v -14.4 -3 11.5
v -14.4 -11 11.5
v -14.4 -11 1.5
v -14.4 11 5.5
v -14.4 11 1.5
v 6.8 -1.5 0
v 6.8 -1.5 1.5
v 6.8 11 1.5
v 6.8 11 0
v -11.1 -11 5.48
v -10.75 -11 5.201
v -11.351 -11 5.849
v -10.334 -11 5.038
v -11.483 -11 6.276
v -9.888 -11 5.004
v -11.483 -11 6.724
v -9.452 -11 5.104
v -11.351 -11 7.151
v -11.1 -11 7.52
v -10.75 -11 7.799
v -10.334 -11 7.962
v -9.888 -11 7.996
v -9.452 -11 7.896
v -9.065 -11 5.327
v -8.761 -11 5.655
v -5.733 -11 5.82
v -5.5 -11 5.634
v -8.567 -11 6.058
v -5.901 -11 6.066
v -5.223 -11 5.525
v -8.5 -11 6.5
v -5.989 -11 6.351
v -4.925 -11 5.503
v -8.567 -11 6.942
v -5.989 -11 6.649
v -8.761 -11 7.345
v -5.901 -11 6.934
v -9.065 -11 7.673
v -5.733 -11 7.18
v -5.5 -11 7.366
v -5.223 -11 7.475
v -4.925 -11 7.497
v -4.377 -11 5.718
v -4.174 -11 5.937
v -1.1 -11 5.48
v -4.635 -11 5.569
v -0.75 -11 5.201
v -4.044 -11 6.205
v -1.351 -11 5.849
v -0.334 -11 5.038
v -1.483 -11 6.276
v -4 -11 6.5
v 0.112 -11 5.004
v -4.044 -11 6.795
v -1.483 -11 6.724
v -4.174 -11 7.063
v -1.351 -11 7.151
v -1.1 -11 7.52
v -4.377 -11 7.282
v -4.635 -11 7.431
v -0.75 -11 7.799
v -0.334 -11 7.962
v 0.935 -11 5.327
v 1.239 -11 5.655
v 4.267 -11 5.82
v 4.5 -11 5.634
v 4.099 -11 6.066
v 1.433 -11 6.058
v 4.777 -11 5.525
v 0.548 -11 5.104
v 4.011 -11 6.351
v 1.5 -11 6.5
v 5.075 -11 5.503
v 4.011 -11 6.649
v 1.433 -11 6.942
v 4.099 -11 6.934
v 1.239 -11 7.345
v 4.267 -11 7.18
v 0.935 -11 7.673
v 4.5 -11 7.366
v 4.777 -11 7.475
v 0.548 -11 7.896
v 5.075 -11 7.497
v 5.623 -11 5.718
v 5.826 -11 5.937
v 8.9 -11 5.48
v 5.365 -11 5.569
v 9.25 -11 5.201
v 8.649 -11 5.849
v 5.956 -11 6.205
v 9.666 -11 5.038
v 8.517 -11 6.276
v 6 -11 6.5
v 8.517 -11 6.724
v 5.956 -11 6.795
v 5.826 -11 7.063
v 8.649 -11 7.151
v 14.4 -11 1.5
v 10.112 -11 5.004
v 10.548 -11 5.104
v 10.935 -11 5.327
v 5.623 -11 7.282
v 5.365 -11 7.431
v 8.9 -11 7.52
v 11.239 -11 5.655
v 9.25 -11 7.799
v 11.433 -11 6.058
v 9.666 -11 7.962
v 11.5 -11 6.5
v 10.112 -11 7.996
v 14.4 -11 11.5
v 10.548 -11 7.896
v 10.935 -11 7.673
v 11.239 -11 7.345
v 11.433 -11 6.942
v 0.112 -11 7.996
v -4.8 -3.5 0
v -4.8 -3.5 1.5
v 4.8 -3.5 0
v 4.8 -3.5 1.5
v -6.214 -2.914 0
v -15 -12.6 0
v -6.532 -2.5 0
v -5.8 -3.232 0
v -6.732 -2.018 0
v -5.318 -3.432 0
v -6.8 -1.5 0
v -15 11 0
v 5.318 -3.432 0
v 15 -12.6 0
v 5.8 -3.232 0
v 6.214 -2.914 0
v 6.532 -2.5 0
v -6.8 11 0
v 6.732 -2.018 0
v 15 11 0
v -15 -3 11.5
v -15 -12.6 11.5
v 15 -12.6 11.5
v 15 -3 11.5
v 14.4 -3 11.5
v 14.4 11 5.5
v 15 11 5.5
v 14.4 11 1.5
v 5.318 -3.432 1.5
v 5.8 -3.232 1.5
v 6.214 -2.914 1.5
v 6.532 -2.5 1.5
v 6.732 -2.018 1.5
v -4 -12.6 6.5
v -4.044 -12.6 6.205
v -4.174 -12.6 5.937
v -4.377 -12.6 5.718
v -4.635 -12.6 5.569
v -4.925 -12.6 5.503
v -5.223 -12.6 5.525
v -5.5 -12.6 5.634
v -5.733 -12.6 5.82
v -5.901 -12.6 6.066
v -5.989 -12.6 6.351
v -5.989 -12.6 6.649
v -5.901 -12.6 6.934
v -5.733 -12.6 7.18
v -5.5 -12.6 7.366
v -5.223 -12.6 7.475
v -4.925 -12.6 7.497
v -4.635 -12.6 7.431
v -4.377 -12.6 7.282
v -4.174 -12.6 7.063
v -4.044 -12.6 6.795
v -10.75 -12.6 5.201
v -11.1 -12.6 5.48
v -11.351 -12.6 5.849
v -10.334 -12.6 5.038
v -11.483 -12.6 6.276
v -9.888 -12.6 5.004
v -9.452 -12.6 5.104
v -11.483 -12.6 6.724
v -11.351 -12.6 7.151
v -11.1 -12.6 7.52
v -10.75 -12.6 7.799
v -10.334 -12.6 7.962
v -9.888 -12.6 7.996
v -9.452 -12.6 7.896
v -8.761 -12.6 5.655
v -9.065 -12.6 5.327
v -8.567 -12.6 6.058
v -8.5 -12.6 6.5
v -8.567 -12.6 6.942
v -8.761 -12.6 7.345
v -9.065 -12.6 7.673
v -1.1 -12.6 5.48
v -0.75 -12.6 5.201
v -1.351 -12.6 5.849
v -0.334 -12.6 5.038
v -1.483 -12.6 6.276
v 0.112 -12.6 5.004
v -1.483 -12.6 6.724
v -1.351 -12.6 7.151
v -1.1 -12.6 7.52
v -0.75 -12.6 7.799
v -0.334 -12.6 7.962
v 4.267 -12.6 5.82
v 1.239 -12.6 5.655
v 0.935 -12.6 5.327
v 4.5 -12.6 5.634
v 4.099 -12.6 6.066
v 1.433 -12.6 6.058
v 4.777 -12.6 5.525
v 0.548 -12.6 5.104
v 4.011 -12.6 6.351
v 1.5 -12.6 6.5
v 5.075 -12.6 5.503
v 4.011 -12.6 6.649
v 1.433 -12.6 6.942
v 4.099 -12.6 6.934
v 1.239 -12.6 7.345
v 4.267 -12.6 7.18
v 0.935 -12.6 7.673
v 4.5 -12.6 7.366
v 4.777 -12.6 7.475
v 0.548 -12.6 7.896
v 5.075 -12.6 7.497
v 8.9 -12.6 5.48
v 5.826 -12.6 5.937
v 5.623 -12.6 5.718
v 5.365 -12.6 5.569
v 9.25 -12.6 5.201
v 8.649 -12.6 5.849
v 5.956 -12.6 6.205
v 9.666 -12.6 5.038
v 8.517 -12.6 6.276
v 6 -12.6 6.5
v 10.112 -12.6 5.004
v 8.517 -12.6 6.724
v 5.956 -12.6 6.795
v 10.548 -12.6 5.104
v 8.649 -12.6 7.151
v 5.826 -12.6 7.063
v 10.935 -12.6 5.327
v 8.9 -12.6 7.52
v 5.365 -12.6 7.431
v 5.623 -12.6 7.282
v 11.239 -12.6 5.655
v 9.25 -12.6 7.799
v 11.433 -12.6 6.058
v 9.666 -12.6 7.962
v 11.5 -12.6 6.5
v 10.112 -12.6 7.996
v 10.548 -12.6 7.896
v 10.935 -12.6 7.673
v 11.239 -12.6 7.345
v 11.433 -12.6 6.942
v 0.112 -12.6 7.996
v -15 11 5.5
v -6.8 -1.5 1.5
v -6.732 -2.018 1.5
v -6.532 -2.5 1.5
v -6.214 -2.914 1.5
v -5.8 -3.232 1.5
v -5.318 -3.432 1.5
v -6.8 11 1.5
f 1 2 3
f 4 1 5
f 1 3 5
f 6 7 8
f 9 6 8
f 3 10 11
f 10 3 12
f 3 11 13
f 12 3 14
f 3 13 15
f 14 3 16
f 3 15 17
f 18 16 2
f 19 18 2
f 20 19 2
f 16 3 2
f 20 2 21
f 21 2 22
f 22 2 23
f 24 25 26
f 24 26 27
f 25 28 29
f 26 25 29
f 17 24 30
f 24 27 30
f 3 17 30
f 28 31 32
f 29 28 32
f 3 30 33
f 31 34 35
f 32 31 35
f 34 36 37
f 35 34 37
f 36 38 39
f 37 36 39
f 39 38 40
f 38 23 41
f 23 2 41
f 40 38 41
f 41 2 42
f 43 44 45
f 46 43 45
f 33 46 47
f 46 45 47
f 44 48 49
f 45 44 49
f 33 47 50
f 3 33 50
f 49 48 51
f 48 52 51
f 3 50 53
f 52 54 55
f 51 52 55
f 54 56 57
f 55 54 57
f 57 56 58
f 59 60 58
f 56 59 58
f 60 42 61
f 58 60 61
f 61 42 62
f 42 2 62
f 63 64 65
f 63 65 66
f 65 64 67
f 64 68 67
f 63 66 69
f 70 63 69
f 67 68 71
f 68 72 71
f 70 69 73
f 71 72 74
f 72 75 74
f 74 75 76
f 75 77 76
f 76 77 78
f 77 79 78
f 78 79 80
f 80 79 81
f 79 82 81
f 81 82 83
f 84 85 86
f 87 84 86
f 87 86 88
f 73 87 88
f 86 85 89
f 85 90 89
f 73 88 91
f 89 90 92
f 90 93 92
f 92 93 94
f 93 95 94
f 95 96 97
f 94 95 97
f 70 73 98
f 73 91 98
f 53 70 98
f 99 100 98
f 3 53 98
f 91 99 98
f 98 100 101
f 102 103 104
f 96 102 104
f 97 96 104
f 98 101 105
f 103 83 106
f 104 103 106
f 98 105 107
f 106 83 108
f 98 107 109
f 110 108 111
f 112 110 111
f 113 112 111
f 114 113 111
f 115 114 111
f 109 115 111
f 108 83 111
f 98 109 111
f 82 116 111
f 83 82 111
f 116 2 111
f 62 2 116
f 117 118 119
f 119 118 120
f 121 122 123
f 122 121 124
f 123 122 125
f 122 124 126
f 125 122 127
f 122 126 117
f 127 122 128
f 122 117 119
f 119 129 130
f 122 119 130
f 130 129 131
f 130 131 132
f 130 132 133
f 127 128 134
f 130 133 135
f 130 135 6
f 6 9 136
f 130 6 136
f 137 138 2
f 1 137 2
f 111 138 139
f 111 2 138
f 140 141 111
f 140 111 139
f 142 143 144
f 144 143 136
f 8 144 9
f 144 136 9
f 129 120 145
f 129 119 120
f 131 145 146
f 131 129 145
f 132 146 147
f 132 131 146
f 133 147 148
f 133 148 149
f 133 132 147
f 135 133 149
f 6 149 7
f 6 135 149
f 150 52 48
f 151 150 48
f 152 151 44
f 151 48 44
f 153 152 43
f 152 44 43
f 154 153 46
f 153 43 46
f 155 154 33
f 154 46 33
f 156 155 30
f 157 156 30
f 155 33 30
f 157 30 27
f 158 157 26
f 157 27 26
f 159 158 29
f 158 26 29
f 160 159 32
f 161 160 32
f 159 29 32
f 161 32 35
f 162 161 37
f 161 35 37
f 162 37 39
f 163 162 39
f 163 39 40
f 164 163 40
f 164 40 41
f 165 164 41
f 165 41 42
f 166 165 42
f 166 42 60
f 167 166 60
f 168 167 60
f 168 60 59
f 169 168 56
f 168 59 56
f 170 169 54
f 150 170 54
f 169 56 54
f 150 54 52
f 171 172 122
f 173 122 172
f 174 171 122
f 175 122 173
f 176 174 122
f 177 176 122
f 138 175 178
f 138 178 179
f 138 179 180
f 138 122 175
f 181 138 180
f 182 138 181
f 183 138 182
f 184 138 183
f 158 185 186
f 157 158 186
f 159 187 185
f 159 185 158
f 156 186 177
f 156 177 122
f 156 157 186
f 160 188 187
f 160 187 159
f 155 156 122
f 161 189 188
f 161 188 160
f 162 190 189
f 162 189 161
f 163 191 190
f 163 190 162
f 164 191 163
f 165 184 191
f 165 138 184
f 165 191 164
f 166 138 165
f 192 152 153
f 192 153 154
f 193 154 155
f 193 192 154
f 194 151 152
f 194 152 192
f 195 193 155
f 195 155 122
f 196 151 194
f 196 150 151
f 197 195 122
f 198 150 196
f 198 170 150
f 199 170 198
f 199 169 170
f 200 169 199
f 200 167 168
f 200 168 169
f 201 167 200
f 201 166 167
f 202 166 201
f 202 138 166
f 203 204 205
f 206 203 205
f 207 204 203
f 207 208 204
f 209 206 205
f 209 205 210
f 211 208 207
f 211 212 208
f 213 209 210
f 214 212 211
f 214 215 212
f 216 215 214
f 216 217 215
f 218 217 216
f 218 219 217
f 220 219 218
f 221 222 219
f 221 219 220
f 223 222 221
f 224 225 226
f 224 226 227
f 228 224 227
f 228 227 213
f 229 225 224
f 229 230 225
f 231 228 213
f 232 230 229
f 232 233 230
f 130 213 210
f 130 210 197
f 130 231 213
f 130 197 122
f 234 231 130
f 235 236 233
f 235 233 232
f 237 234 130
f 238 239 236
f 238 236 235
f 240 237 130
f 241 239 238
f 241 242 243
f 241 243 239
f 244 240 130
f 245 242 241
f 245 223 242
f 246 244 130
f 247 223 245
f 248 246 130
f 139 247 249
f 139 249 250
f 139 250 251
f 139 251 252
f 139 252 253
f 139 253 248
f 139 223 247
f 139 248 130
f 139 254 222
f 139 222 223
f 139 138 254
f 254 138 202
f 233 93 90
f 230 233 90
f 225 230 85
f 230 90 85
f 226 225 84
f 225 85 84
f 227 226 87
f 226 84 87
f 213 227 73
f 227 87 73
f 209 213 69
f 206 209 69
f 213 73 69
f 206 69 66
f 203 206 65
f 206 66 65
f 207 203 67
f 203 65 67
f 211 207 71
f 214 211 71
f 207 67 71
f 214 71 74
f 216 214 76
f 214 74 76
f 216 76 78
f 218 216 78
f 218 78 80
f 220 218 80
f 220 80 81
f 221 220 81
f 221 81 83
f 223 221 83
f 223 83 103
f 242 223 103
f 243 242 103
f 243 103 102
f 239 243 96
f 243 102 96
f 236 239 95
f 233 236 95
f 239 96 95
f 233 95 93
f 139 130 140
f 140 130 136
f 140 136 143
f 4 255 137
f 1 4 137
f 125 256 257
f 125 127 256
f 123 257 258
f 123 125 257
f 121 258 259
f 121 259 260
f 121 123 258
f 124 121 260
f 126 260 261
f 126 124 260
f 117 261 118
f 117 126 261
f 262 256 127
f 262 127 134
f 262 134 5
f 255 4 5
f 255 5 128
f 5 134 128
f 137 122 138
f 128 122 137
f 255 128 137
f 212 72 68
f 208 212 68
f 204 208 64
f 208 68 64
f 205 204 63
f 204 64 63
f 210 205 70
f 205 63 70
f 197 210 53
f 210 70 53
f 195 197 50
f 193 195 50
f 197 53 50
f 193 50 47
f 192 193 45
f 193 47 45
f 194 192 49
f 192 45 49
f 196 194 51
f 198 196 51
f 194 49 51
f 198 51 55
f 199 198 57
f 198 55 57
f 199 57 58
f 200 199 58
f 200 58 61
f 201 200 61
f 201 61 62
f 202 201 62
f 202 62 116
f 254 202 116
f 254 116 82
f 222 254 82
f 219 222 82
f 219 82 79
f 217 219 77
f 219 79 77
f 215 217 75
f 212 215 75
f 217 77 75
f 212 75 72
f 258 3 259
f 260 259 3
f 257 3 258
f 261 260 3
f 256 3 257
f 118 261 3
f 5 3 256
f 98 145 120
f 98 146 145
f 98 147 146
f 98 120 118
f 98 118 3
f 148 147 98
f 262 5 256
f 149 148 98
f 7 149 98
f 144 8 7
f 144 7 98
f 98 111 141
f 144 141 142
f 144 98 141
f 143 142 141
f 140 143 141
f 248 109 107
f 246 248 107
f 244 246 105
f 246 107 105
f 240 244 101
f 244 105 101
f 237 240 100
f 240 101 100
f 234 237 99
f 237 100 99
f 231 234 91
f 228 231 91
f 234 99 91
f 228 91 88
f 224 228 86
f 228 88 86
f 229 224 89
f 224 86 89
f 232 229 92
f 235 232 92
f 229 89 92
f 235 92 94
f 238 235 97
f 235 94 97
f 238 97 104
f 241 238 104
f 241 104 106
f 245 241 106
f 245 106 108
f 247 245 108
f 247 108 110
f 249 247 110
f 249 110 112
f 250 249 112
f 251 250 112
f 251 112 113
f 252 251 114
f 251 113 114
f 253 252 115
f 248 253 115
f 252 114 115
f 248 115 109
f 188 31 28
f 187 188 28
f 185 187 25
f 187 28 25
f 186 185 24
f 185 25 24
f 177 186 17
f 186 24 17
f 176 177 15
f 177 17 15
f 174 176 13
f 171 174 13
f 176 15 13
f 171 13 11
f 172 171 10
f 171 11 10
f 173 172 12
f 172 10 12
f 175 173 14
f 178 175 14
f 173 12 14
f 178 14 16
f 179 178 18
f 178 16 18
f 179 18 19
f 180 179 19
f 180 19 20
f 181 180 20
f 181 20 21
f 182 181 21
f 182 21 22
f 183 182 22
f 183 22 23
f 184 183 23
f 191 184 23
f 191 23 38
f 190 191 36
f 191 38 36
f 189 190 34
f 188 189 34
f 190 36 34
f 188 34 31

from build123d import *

# Parameters (mm, degrees)
SKETCH3_W               = 30
SKETCH3_H               = 22
BOSS_EXTRUDE1_DEPTH     = 1.5
SKETCH4_W               = 0.6
SKETCH4_H               = 22
BOSS_EXTRUDE2_DEPTH     = 10
CUT_EXTRUDE1_DEPTH      = 1
CUT_EXTRUDE1_DEPTH_BACK = 31
SKETCH6_W               = 30
SKETCH6_H               = 11.5
BOSS_EXTRUDE3_DEPTH     = 1.6
SKETCH7_W               = 13.6
SKETCH7_H               = 14.5
CUT_EXTRUDE2_DEPTH      = 1.6
FILLET1_R               = 2
SKETCH8_R               = 1.5
SKETCH8_R_2             = 1
CUT_EXTRUDE3_DEPTH      = 1.6


with BuildPart() as part:
    # Sketch3 → Boss-Extrude1 (new body)
    with BuildSketch(Plane.XY):
        Rectangle(SKETCH3_W, SKETCH3_H)
    extrude(amount=BOSS_EXTRUDE1_DEPTH)

    # Sketch4 → Boss-Extrude2 (add)
    with BuildSketch(Plane.XY.offset(1.5)):
        with Locations((-14.7, 0)):
            Rectangle(SKETCH4_W, SKETCH4_H)
    boss_extrude2 = extrude(amount=BOSS_EXTRUDE2_DEPTH)

    # Mirror5: Boss-Extrude2 across plane
    add(boss_extrude2.mirror(Plane(origin=(0, 0, 0), x_dir=(0, 0, 1), z_dir=(1, 0, 0))))

    # Sketch5 → Cut-Extrude1 (cut, two sides)
    with BuildSketch(Plane.ZY.offset(15)) as cut_extrude1_sk:
        Polygon((-16.404677134, 62.110913313), (5.5, 11), (11.5, -3), (33.404677134, -54.110913313), (135.626503761, -10.301559045), (85.817149492, 105.920267582), align=None)
    extrude(amount=CUT_EXTRUDE1_DEPTH, mode=Mode.SUBTRACT)
    extrude(cut_extrude1_sk.sketch, amount=-CUT_EXTRUDE1_DEPTH_BACK, mode=Mode.SUBTRACT)

    # Sketch6 → Boss-Extrude3 (add)
    with BuildSketch(Plane.XZ.offset(11)):
        with Locations((0, 5.75)):
            Rectangle(SKETCH6_W, SKETCH6_H)
    extrude(amount=BOSS_EXTRUDE3_DEPTH)

    # Sketch7 → Cut-Extrude2 (cut)
    with BuildSketch(Plane.XY.offset(1.5)):
        with Locations((0, 3.75)):
            Rectangle(SKETCH7_W, SKETCH7_H)
    extrude(amount=-CUT_EXTRUDE2_DEPTH, mode=Mode.SUBTRACT)

    # Fillet1
    fillet1_edges = [part.edges().sort_by_distance(p)[0] for p in [
        (-6.8, -3.5, 0.75),
        (6.8, -3.5, 0.75),
    ]]
    fillet(fillet1_edges, radius=FILLET1_R)

    # Sketch8 → Cut-Extrude3 (cut)
    with BuildSketch(Plane(origin=(0, -11, 0), x_dir=(1, 0, 0), z_dir=(0, 1, 0))):
        with Locations((0, -6.5)):
            Circle(SKETCH8_R)
        with Locations((-5, -6.5)):
            Circle(SKETCH8_R_2)
        with Locations((-10, -6.5)):
            Circle(SKETCH8_R)
        with Locations((5, -6.5)):
            Circle(SKETCH8_R_2)
        with Locations((10, -6.5)):
            Circle(SKETCH8_R)
    extrude(amount=-CUT_EXTRUDE3_DEPTH, mode=Mode.SUBTRACT)


solid = part.part
